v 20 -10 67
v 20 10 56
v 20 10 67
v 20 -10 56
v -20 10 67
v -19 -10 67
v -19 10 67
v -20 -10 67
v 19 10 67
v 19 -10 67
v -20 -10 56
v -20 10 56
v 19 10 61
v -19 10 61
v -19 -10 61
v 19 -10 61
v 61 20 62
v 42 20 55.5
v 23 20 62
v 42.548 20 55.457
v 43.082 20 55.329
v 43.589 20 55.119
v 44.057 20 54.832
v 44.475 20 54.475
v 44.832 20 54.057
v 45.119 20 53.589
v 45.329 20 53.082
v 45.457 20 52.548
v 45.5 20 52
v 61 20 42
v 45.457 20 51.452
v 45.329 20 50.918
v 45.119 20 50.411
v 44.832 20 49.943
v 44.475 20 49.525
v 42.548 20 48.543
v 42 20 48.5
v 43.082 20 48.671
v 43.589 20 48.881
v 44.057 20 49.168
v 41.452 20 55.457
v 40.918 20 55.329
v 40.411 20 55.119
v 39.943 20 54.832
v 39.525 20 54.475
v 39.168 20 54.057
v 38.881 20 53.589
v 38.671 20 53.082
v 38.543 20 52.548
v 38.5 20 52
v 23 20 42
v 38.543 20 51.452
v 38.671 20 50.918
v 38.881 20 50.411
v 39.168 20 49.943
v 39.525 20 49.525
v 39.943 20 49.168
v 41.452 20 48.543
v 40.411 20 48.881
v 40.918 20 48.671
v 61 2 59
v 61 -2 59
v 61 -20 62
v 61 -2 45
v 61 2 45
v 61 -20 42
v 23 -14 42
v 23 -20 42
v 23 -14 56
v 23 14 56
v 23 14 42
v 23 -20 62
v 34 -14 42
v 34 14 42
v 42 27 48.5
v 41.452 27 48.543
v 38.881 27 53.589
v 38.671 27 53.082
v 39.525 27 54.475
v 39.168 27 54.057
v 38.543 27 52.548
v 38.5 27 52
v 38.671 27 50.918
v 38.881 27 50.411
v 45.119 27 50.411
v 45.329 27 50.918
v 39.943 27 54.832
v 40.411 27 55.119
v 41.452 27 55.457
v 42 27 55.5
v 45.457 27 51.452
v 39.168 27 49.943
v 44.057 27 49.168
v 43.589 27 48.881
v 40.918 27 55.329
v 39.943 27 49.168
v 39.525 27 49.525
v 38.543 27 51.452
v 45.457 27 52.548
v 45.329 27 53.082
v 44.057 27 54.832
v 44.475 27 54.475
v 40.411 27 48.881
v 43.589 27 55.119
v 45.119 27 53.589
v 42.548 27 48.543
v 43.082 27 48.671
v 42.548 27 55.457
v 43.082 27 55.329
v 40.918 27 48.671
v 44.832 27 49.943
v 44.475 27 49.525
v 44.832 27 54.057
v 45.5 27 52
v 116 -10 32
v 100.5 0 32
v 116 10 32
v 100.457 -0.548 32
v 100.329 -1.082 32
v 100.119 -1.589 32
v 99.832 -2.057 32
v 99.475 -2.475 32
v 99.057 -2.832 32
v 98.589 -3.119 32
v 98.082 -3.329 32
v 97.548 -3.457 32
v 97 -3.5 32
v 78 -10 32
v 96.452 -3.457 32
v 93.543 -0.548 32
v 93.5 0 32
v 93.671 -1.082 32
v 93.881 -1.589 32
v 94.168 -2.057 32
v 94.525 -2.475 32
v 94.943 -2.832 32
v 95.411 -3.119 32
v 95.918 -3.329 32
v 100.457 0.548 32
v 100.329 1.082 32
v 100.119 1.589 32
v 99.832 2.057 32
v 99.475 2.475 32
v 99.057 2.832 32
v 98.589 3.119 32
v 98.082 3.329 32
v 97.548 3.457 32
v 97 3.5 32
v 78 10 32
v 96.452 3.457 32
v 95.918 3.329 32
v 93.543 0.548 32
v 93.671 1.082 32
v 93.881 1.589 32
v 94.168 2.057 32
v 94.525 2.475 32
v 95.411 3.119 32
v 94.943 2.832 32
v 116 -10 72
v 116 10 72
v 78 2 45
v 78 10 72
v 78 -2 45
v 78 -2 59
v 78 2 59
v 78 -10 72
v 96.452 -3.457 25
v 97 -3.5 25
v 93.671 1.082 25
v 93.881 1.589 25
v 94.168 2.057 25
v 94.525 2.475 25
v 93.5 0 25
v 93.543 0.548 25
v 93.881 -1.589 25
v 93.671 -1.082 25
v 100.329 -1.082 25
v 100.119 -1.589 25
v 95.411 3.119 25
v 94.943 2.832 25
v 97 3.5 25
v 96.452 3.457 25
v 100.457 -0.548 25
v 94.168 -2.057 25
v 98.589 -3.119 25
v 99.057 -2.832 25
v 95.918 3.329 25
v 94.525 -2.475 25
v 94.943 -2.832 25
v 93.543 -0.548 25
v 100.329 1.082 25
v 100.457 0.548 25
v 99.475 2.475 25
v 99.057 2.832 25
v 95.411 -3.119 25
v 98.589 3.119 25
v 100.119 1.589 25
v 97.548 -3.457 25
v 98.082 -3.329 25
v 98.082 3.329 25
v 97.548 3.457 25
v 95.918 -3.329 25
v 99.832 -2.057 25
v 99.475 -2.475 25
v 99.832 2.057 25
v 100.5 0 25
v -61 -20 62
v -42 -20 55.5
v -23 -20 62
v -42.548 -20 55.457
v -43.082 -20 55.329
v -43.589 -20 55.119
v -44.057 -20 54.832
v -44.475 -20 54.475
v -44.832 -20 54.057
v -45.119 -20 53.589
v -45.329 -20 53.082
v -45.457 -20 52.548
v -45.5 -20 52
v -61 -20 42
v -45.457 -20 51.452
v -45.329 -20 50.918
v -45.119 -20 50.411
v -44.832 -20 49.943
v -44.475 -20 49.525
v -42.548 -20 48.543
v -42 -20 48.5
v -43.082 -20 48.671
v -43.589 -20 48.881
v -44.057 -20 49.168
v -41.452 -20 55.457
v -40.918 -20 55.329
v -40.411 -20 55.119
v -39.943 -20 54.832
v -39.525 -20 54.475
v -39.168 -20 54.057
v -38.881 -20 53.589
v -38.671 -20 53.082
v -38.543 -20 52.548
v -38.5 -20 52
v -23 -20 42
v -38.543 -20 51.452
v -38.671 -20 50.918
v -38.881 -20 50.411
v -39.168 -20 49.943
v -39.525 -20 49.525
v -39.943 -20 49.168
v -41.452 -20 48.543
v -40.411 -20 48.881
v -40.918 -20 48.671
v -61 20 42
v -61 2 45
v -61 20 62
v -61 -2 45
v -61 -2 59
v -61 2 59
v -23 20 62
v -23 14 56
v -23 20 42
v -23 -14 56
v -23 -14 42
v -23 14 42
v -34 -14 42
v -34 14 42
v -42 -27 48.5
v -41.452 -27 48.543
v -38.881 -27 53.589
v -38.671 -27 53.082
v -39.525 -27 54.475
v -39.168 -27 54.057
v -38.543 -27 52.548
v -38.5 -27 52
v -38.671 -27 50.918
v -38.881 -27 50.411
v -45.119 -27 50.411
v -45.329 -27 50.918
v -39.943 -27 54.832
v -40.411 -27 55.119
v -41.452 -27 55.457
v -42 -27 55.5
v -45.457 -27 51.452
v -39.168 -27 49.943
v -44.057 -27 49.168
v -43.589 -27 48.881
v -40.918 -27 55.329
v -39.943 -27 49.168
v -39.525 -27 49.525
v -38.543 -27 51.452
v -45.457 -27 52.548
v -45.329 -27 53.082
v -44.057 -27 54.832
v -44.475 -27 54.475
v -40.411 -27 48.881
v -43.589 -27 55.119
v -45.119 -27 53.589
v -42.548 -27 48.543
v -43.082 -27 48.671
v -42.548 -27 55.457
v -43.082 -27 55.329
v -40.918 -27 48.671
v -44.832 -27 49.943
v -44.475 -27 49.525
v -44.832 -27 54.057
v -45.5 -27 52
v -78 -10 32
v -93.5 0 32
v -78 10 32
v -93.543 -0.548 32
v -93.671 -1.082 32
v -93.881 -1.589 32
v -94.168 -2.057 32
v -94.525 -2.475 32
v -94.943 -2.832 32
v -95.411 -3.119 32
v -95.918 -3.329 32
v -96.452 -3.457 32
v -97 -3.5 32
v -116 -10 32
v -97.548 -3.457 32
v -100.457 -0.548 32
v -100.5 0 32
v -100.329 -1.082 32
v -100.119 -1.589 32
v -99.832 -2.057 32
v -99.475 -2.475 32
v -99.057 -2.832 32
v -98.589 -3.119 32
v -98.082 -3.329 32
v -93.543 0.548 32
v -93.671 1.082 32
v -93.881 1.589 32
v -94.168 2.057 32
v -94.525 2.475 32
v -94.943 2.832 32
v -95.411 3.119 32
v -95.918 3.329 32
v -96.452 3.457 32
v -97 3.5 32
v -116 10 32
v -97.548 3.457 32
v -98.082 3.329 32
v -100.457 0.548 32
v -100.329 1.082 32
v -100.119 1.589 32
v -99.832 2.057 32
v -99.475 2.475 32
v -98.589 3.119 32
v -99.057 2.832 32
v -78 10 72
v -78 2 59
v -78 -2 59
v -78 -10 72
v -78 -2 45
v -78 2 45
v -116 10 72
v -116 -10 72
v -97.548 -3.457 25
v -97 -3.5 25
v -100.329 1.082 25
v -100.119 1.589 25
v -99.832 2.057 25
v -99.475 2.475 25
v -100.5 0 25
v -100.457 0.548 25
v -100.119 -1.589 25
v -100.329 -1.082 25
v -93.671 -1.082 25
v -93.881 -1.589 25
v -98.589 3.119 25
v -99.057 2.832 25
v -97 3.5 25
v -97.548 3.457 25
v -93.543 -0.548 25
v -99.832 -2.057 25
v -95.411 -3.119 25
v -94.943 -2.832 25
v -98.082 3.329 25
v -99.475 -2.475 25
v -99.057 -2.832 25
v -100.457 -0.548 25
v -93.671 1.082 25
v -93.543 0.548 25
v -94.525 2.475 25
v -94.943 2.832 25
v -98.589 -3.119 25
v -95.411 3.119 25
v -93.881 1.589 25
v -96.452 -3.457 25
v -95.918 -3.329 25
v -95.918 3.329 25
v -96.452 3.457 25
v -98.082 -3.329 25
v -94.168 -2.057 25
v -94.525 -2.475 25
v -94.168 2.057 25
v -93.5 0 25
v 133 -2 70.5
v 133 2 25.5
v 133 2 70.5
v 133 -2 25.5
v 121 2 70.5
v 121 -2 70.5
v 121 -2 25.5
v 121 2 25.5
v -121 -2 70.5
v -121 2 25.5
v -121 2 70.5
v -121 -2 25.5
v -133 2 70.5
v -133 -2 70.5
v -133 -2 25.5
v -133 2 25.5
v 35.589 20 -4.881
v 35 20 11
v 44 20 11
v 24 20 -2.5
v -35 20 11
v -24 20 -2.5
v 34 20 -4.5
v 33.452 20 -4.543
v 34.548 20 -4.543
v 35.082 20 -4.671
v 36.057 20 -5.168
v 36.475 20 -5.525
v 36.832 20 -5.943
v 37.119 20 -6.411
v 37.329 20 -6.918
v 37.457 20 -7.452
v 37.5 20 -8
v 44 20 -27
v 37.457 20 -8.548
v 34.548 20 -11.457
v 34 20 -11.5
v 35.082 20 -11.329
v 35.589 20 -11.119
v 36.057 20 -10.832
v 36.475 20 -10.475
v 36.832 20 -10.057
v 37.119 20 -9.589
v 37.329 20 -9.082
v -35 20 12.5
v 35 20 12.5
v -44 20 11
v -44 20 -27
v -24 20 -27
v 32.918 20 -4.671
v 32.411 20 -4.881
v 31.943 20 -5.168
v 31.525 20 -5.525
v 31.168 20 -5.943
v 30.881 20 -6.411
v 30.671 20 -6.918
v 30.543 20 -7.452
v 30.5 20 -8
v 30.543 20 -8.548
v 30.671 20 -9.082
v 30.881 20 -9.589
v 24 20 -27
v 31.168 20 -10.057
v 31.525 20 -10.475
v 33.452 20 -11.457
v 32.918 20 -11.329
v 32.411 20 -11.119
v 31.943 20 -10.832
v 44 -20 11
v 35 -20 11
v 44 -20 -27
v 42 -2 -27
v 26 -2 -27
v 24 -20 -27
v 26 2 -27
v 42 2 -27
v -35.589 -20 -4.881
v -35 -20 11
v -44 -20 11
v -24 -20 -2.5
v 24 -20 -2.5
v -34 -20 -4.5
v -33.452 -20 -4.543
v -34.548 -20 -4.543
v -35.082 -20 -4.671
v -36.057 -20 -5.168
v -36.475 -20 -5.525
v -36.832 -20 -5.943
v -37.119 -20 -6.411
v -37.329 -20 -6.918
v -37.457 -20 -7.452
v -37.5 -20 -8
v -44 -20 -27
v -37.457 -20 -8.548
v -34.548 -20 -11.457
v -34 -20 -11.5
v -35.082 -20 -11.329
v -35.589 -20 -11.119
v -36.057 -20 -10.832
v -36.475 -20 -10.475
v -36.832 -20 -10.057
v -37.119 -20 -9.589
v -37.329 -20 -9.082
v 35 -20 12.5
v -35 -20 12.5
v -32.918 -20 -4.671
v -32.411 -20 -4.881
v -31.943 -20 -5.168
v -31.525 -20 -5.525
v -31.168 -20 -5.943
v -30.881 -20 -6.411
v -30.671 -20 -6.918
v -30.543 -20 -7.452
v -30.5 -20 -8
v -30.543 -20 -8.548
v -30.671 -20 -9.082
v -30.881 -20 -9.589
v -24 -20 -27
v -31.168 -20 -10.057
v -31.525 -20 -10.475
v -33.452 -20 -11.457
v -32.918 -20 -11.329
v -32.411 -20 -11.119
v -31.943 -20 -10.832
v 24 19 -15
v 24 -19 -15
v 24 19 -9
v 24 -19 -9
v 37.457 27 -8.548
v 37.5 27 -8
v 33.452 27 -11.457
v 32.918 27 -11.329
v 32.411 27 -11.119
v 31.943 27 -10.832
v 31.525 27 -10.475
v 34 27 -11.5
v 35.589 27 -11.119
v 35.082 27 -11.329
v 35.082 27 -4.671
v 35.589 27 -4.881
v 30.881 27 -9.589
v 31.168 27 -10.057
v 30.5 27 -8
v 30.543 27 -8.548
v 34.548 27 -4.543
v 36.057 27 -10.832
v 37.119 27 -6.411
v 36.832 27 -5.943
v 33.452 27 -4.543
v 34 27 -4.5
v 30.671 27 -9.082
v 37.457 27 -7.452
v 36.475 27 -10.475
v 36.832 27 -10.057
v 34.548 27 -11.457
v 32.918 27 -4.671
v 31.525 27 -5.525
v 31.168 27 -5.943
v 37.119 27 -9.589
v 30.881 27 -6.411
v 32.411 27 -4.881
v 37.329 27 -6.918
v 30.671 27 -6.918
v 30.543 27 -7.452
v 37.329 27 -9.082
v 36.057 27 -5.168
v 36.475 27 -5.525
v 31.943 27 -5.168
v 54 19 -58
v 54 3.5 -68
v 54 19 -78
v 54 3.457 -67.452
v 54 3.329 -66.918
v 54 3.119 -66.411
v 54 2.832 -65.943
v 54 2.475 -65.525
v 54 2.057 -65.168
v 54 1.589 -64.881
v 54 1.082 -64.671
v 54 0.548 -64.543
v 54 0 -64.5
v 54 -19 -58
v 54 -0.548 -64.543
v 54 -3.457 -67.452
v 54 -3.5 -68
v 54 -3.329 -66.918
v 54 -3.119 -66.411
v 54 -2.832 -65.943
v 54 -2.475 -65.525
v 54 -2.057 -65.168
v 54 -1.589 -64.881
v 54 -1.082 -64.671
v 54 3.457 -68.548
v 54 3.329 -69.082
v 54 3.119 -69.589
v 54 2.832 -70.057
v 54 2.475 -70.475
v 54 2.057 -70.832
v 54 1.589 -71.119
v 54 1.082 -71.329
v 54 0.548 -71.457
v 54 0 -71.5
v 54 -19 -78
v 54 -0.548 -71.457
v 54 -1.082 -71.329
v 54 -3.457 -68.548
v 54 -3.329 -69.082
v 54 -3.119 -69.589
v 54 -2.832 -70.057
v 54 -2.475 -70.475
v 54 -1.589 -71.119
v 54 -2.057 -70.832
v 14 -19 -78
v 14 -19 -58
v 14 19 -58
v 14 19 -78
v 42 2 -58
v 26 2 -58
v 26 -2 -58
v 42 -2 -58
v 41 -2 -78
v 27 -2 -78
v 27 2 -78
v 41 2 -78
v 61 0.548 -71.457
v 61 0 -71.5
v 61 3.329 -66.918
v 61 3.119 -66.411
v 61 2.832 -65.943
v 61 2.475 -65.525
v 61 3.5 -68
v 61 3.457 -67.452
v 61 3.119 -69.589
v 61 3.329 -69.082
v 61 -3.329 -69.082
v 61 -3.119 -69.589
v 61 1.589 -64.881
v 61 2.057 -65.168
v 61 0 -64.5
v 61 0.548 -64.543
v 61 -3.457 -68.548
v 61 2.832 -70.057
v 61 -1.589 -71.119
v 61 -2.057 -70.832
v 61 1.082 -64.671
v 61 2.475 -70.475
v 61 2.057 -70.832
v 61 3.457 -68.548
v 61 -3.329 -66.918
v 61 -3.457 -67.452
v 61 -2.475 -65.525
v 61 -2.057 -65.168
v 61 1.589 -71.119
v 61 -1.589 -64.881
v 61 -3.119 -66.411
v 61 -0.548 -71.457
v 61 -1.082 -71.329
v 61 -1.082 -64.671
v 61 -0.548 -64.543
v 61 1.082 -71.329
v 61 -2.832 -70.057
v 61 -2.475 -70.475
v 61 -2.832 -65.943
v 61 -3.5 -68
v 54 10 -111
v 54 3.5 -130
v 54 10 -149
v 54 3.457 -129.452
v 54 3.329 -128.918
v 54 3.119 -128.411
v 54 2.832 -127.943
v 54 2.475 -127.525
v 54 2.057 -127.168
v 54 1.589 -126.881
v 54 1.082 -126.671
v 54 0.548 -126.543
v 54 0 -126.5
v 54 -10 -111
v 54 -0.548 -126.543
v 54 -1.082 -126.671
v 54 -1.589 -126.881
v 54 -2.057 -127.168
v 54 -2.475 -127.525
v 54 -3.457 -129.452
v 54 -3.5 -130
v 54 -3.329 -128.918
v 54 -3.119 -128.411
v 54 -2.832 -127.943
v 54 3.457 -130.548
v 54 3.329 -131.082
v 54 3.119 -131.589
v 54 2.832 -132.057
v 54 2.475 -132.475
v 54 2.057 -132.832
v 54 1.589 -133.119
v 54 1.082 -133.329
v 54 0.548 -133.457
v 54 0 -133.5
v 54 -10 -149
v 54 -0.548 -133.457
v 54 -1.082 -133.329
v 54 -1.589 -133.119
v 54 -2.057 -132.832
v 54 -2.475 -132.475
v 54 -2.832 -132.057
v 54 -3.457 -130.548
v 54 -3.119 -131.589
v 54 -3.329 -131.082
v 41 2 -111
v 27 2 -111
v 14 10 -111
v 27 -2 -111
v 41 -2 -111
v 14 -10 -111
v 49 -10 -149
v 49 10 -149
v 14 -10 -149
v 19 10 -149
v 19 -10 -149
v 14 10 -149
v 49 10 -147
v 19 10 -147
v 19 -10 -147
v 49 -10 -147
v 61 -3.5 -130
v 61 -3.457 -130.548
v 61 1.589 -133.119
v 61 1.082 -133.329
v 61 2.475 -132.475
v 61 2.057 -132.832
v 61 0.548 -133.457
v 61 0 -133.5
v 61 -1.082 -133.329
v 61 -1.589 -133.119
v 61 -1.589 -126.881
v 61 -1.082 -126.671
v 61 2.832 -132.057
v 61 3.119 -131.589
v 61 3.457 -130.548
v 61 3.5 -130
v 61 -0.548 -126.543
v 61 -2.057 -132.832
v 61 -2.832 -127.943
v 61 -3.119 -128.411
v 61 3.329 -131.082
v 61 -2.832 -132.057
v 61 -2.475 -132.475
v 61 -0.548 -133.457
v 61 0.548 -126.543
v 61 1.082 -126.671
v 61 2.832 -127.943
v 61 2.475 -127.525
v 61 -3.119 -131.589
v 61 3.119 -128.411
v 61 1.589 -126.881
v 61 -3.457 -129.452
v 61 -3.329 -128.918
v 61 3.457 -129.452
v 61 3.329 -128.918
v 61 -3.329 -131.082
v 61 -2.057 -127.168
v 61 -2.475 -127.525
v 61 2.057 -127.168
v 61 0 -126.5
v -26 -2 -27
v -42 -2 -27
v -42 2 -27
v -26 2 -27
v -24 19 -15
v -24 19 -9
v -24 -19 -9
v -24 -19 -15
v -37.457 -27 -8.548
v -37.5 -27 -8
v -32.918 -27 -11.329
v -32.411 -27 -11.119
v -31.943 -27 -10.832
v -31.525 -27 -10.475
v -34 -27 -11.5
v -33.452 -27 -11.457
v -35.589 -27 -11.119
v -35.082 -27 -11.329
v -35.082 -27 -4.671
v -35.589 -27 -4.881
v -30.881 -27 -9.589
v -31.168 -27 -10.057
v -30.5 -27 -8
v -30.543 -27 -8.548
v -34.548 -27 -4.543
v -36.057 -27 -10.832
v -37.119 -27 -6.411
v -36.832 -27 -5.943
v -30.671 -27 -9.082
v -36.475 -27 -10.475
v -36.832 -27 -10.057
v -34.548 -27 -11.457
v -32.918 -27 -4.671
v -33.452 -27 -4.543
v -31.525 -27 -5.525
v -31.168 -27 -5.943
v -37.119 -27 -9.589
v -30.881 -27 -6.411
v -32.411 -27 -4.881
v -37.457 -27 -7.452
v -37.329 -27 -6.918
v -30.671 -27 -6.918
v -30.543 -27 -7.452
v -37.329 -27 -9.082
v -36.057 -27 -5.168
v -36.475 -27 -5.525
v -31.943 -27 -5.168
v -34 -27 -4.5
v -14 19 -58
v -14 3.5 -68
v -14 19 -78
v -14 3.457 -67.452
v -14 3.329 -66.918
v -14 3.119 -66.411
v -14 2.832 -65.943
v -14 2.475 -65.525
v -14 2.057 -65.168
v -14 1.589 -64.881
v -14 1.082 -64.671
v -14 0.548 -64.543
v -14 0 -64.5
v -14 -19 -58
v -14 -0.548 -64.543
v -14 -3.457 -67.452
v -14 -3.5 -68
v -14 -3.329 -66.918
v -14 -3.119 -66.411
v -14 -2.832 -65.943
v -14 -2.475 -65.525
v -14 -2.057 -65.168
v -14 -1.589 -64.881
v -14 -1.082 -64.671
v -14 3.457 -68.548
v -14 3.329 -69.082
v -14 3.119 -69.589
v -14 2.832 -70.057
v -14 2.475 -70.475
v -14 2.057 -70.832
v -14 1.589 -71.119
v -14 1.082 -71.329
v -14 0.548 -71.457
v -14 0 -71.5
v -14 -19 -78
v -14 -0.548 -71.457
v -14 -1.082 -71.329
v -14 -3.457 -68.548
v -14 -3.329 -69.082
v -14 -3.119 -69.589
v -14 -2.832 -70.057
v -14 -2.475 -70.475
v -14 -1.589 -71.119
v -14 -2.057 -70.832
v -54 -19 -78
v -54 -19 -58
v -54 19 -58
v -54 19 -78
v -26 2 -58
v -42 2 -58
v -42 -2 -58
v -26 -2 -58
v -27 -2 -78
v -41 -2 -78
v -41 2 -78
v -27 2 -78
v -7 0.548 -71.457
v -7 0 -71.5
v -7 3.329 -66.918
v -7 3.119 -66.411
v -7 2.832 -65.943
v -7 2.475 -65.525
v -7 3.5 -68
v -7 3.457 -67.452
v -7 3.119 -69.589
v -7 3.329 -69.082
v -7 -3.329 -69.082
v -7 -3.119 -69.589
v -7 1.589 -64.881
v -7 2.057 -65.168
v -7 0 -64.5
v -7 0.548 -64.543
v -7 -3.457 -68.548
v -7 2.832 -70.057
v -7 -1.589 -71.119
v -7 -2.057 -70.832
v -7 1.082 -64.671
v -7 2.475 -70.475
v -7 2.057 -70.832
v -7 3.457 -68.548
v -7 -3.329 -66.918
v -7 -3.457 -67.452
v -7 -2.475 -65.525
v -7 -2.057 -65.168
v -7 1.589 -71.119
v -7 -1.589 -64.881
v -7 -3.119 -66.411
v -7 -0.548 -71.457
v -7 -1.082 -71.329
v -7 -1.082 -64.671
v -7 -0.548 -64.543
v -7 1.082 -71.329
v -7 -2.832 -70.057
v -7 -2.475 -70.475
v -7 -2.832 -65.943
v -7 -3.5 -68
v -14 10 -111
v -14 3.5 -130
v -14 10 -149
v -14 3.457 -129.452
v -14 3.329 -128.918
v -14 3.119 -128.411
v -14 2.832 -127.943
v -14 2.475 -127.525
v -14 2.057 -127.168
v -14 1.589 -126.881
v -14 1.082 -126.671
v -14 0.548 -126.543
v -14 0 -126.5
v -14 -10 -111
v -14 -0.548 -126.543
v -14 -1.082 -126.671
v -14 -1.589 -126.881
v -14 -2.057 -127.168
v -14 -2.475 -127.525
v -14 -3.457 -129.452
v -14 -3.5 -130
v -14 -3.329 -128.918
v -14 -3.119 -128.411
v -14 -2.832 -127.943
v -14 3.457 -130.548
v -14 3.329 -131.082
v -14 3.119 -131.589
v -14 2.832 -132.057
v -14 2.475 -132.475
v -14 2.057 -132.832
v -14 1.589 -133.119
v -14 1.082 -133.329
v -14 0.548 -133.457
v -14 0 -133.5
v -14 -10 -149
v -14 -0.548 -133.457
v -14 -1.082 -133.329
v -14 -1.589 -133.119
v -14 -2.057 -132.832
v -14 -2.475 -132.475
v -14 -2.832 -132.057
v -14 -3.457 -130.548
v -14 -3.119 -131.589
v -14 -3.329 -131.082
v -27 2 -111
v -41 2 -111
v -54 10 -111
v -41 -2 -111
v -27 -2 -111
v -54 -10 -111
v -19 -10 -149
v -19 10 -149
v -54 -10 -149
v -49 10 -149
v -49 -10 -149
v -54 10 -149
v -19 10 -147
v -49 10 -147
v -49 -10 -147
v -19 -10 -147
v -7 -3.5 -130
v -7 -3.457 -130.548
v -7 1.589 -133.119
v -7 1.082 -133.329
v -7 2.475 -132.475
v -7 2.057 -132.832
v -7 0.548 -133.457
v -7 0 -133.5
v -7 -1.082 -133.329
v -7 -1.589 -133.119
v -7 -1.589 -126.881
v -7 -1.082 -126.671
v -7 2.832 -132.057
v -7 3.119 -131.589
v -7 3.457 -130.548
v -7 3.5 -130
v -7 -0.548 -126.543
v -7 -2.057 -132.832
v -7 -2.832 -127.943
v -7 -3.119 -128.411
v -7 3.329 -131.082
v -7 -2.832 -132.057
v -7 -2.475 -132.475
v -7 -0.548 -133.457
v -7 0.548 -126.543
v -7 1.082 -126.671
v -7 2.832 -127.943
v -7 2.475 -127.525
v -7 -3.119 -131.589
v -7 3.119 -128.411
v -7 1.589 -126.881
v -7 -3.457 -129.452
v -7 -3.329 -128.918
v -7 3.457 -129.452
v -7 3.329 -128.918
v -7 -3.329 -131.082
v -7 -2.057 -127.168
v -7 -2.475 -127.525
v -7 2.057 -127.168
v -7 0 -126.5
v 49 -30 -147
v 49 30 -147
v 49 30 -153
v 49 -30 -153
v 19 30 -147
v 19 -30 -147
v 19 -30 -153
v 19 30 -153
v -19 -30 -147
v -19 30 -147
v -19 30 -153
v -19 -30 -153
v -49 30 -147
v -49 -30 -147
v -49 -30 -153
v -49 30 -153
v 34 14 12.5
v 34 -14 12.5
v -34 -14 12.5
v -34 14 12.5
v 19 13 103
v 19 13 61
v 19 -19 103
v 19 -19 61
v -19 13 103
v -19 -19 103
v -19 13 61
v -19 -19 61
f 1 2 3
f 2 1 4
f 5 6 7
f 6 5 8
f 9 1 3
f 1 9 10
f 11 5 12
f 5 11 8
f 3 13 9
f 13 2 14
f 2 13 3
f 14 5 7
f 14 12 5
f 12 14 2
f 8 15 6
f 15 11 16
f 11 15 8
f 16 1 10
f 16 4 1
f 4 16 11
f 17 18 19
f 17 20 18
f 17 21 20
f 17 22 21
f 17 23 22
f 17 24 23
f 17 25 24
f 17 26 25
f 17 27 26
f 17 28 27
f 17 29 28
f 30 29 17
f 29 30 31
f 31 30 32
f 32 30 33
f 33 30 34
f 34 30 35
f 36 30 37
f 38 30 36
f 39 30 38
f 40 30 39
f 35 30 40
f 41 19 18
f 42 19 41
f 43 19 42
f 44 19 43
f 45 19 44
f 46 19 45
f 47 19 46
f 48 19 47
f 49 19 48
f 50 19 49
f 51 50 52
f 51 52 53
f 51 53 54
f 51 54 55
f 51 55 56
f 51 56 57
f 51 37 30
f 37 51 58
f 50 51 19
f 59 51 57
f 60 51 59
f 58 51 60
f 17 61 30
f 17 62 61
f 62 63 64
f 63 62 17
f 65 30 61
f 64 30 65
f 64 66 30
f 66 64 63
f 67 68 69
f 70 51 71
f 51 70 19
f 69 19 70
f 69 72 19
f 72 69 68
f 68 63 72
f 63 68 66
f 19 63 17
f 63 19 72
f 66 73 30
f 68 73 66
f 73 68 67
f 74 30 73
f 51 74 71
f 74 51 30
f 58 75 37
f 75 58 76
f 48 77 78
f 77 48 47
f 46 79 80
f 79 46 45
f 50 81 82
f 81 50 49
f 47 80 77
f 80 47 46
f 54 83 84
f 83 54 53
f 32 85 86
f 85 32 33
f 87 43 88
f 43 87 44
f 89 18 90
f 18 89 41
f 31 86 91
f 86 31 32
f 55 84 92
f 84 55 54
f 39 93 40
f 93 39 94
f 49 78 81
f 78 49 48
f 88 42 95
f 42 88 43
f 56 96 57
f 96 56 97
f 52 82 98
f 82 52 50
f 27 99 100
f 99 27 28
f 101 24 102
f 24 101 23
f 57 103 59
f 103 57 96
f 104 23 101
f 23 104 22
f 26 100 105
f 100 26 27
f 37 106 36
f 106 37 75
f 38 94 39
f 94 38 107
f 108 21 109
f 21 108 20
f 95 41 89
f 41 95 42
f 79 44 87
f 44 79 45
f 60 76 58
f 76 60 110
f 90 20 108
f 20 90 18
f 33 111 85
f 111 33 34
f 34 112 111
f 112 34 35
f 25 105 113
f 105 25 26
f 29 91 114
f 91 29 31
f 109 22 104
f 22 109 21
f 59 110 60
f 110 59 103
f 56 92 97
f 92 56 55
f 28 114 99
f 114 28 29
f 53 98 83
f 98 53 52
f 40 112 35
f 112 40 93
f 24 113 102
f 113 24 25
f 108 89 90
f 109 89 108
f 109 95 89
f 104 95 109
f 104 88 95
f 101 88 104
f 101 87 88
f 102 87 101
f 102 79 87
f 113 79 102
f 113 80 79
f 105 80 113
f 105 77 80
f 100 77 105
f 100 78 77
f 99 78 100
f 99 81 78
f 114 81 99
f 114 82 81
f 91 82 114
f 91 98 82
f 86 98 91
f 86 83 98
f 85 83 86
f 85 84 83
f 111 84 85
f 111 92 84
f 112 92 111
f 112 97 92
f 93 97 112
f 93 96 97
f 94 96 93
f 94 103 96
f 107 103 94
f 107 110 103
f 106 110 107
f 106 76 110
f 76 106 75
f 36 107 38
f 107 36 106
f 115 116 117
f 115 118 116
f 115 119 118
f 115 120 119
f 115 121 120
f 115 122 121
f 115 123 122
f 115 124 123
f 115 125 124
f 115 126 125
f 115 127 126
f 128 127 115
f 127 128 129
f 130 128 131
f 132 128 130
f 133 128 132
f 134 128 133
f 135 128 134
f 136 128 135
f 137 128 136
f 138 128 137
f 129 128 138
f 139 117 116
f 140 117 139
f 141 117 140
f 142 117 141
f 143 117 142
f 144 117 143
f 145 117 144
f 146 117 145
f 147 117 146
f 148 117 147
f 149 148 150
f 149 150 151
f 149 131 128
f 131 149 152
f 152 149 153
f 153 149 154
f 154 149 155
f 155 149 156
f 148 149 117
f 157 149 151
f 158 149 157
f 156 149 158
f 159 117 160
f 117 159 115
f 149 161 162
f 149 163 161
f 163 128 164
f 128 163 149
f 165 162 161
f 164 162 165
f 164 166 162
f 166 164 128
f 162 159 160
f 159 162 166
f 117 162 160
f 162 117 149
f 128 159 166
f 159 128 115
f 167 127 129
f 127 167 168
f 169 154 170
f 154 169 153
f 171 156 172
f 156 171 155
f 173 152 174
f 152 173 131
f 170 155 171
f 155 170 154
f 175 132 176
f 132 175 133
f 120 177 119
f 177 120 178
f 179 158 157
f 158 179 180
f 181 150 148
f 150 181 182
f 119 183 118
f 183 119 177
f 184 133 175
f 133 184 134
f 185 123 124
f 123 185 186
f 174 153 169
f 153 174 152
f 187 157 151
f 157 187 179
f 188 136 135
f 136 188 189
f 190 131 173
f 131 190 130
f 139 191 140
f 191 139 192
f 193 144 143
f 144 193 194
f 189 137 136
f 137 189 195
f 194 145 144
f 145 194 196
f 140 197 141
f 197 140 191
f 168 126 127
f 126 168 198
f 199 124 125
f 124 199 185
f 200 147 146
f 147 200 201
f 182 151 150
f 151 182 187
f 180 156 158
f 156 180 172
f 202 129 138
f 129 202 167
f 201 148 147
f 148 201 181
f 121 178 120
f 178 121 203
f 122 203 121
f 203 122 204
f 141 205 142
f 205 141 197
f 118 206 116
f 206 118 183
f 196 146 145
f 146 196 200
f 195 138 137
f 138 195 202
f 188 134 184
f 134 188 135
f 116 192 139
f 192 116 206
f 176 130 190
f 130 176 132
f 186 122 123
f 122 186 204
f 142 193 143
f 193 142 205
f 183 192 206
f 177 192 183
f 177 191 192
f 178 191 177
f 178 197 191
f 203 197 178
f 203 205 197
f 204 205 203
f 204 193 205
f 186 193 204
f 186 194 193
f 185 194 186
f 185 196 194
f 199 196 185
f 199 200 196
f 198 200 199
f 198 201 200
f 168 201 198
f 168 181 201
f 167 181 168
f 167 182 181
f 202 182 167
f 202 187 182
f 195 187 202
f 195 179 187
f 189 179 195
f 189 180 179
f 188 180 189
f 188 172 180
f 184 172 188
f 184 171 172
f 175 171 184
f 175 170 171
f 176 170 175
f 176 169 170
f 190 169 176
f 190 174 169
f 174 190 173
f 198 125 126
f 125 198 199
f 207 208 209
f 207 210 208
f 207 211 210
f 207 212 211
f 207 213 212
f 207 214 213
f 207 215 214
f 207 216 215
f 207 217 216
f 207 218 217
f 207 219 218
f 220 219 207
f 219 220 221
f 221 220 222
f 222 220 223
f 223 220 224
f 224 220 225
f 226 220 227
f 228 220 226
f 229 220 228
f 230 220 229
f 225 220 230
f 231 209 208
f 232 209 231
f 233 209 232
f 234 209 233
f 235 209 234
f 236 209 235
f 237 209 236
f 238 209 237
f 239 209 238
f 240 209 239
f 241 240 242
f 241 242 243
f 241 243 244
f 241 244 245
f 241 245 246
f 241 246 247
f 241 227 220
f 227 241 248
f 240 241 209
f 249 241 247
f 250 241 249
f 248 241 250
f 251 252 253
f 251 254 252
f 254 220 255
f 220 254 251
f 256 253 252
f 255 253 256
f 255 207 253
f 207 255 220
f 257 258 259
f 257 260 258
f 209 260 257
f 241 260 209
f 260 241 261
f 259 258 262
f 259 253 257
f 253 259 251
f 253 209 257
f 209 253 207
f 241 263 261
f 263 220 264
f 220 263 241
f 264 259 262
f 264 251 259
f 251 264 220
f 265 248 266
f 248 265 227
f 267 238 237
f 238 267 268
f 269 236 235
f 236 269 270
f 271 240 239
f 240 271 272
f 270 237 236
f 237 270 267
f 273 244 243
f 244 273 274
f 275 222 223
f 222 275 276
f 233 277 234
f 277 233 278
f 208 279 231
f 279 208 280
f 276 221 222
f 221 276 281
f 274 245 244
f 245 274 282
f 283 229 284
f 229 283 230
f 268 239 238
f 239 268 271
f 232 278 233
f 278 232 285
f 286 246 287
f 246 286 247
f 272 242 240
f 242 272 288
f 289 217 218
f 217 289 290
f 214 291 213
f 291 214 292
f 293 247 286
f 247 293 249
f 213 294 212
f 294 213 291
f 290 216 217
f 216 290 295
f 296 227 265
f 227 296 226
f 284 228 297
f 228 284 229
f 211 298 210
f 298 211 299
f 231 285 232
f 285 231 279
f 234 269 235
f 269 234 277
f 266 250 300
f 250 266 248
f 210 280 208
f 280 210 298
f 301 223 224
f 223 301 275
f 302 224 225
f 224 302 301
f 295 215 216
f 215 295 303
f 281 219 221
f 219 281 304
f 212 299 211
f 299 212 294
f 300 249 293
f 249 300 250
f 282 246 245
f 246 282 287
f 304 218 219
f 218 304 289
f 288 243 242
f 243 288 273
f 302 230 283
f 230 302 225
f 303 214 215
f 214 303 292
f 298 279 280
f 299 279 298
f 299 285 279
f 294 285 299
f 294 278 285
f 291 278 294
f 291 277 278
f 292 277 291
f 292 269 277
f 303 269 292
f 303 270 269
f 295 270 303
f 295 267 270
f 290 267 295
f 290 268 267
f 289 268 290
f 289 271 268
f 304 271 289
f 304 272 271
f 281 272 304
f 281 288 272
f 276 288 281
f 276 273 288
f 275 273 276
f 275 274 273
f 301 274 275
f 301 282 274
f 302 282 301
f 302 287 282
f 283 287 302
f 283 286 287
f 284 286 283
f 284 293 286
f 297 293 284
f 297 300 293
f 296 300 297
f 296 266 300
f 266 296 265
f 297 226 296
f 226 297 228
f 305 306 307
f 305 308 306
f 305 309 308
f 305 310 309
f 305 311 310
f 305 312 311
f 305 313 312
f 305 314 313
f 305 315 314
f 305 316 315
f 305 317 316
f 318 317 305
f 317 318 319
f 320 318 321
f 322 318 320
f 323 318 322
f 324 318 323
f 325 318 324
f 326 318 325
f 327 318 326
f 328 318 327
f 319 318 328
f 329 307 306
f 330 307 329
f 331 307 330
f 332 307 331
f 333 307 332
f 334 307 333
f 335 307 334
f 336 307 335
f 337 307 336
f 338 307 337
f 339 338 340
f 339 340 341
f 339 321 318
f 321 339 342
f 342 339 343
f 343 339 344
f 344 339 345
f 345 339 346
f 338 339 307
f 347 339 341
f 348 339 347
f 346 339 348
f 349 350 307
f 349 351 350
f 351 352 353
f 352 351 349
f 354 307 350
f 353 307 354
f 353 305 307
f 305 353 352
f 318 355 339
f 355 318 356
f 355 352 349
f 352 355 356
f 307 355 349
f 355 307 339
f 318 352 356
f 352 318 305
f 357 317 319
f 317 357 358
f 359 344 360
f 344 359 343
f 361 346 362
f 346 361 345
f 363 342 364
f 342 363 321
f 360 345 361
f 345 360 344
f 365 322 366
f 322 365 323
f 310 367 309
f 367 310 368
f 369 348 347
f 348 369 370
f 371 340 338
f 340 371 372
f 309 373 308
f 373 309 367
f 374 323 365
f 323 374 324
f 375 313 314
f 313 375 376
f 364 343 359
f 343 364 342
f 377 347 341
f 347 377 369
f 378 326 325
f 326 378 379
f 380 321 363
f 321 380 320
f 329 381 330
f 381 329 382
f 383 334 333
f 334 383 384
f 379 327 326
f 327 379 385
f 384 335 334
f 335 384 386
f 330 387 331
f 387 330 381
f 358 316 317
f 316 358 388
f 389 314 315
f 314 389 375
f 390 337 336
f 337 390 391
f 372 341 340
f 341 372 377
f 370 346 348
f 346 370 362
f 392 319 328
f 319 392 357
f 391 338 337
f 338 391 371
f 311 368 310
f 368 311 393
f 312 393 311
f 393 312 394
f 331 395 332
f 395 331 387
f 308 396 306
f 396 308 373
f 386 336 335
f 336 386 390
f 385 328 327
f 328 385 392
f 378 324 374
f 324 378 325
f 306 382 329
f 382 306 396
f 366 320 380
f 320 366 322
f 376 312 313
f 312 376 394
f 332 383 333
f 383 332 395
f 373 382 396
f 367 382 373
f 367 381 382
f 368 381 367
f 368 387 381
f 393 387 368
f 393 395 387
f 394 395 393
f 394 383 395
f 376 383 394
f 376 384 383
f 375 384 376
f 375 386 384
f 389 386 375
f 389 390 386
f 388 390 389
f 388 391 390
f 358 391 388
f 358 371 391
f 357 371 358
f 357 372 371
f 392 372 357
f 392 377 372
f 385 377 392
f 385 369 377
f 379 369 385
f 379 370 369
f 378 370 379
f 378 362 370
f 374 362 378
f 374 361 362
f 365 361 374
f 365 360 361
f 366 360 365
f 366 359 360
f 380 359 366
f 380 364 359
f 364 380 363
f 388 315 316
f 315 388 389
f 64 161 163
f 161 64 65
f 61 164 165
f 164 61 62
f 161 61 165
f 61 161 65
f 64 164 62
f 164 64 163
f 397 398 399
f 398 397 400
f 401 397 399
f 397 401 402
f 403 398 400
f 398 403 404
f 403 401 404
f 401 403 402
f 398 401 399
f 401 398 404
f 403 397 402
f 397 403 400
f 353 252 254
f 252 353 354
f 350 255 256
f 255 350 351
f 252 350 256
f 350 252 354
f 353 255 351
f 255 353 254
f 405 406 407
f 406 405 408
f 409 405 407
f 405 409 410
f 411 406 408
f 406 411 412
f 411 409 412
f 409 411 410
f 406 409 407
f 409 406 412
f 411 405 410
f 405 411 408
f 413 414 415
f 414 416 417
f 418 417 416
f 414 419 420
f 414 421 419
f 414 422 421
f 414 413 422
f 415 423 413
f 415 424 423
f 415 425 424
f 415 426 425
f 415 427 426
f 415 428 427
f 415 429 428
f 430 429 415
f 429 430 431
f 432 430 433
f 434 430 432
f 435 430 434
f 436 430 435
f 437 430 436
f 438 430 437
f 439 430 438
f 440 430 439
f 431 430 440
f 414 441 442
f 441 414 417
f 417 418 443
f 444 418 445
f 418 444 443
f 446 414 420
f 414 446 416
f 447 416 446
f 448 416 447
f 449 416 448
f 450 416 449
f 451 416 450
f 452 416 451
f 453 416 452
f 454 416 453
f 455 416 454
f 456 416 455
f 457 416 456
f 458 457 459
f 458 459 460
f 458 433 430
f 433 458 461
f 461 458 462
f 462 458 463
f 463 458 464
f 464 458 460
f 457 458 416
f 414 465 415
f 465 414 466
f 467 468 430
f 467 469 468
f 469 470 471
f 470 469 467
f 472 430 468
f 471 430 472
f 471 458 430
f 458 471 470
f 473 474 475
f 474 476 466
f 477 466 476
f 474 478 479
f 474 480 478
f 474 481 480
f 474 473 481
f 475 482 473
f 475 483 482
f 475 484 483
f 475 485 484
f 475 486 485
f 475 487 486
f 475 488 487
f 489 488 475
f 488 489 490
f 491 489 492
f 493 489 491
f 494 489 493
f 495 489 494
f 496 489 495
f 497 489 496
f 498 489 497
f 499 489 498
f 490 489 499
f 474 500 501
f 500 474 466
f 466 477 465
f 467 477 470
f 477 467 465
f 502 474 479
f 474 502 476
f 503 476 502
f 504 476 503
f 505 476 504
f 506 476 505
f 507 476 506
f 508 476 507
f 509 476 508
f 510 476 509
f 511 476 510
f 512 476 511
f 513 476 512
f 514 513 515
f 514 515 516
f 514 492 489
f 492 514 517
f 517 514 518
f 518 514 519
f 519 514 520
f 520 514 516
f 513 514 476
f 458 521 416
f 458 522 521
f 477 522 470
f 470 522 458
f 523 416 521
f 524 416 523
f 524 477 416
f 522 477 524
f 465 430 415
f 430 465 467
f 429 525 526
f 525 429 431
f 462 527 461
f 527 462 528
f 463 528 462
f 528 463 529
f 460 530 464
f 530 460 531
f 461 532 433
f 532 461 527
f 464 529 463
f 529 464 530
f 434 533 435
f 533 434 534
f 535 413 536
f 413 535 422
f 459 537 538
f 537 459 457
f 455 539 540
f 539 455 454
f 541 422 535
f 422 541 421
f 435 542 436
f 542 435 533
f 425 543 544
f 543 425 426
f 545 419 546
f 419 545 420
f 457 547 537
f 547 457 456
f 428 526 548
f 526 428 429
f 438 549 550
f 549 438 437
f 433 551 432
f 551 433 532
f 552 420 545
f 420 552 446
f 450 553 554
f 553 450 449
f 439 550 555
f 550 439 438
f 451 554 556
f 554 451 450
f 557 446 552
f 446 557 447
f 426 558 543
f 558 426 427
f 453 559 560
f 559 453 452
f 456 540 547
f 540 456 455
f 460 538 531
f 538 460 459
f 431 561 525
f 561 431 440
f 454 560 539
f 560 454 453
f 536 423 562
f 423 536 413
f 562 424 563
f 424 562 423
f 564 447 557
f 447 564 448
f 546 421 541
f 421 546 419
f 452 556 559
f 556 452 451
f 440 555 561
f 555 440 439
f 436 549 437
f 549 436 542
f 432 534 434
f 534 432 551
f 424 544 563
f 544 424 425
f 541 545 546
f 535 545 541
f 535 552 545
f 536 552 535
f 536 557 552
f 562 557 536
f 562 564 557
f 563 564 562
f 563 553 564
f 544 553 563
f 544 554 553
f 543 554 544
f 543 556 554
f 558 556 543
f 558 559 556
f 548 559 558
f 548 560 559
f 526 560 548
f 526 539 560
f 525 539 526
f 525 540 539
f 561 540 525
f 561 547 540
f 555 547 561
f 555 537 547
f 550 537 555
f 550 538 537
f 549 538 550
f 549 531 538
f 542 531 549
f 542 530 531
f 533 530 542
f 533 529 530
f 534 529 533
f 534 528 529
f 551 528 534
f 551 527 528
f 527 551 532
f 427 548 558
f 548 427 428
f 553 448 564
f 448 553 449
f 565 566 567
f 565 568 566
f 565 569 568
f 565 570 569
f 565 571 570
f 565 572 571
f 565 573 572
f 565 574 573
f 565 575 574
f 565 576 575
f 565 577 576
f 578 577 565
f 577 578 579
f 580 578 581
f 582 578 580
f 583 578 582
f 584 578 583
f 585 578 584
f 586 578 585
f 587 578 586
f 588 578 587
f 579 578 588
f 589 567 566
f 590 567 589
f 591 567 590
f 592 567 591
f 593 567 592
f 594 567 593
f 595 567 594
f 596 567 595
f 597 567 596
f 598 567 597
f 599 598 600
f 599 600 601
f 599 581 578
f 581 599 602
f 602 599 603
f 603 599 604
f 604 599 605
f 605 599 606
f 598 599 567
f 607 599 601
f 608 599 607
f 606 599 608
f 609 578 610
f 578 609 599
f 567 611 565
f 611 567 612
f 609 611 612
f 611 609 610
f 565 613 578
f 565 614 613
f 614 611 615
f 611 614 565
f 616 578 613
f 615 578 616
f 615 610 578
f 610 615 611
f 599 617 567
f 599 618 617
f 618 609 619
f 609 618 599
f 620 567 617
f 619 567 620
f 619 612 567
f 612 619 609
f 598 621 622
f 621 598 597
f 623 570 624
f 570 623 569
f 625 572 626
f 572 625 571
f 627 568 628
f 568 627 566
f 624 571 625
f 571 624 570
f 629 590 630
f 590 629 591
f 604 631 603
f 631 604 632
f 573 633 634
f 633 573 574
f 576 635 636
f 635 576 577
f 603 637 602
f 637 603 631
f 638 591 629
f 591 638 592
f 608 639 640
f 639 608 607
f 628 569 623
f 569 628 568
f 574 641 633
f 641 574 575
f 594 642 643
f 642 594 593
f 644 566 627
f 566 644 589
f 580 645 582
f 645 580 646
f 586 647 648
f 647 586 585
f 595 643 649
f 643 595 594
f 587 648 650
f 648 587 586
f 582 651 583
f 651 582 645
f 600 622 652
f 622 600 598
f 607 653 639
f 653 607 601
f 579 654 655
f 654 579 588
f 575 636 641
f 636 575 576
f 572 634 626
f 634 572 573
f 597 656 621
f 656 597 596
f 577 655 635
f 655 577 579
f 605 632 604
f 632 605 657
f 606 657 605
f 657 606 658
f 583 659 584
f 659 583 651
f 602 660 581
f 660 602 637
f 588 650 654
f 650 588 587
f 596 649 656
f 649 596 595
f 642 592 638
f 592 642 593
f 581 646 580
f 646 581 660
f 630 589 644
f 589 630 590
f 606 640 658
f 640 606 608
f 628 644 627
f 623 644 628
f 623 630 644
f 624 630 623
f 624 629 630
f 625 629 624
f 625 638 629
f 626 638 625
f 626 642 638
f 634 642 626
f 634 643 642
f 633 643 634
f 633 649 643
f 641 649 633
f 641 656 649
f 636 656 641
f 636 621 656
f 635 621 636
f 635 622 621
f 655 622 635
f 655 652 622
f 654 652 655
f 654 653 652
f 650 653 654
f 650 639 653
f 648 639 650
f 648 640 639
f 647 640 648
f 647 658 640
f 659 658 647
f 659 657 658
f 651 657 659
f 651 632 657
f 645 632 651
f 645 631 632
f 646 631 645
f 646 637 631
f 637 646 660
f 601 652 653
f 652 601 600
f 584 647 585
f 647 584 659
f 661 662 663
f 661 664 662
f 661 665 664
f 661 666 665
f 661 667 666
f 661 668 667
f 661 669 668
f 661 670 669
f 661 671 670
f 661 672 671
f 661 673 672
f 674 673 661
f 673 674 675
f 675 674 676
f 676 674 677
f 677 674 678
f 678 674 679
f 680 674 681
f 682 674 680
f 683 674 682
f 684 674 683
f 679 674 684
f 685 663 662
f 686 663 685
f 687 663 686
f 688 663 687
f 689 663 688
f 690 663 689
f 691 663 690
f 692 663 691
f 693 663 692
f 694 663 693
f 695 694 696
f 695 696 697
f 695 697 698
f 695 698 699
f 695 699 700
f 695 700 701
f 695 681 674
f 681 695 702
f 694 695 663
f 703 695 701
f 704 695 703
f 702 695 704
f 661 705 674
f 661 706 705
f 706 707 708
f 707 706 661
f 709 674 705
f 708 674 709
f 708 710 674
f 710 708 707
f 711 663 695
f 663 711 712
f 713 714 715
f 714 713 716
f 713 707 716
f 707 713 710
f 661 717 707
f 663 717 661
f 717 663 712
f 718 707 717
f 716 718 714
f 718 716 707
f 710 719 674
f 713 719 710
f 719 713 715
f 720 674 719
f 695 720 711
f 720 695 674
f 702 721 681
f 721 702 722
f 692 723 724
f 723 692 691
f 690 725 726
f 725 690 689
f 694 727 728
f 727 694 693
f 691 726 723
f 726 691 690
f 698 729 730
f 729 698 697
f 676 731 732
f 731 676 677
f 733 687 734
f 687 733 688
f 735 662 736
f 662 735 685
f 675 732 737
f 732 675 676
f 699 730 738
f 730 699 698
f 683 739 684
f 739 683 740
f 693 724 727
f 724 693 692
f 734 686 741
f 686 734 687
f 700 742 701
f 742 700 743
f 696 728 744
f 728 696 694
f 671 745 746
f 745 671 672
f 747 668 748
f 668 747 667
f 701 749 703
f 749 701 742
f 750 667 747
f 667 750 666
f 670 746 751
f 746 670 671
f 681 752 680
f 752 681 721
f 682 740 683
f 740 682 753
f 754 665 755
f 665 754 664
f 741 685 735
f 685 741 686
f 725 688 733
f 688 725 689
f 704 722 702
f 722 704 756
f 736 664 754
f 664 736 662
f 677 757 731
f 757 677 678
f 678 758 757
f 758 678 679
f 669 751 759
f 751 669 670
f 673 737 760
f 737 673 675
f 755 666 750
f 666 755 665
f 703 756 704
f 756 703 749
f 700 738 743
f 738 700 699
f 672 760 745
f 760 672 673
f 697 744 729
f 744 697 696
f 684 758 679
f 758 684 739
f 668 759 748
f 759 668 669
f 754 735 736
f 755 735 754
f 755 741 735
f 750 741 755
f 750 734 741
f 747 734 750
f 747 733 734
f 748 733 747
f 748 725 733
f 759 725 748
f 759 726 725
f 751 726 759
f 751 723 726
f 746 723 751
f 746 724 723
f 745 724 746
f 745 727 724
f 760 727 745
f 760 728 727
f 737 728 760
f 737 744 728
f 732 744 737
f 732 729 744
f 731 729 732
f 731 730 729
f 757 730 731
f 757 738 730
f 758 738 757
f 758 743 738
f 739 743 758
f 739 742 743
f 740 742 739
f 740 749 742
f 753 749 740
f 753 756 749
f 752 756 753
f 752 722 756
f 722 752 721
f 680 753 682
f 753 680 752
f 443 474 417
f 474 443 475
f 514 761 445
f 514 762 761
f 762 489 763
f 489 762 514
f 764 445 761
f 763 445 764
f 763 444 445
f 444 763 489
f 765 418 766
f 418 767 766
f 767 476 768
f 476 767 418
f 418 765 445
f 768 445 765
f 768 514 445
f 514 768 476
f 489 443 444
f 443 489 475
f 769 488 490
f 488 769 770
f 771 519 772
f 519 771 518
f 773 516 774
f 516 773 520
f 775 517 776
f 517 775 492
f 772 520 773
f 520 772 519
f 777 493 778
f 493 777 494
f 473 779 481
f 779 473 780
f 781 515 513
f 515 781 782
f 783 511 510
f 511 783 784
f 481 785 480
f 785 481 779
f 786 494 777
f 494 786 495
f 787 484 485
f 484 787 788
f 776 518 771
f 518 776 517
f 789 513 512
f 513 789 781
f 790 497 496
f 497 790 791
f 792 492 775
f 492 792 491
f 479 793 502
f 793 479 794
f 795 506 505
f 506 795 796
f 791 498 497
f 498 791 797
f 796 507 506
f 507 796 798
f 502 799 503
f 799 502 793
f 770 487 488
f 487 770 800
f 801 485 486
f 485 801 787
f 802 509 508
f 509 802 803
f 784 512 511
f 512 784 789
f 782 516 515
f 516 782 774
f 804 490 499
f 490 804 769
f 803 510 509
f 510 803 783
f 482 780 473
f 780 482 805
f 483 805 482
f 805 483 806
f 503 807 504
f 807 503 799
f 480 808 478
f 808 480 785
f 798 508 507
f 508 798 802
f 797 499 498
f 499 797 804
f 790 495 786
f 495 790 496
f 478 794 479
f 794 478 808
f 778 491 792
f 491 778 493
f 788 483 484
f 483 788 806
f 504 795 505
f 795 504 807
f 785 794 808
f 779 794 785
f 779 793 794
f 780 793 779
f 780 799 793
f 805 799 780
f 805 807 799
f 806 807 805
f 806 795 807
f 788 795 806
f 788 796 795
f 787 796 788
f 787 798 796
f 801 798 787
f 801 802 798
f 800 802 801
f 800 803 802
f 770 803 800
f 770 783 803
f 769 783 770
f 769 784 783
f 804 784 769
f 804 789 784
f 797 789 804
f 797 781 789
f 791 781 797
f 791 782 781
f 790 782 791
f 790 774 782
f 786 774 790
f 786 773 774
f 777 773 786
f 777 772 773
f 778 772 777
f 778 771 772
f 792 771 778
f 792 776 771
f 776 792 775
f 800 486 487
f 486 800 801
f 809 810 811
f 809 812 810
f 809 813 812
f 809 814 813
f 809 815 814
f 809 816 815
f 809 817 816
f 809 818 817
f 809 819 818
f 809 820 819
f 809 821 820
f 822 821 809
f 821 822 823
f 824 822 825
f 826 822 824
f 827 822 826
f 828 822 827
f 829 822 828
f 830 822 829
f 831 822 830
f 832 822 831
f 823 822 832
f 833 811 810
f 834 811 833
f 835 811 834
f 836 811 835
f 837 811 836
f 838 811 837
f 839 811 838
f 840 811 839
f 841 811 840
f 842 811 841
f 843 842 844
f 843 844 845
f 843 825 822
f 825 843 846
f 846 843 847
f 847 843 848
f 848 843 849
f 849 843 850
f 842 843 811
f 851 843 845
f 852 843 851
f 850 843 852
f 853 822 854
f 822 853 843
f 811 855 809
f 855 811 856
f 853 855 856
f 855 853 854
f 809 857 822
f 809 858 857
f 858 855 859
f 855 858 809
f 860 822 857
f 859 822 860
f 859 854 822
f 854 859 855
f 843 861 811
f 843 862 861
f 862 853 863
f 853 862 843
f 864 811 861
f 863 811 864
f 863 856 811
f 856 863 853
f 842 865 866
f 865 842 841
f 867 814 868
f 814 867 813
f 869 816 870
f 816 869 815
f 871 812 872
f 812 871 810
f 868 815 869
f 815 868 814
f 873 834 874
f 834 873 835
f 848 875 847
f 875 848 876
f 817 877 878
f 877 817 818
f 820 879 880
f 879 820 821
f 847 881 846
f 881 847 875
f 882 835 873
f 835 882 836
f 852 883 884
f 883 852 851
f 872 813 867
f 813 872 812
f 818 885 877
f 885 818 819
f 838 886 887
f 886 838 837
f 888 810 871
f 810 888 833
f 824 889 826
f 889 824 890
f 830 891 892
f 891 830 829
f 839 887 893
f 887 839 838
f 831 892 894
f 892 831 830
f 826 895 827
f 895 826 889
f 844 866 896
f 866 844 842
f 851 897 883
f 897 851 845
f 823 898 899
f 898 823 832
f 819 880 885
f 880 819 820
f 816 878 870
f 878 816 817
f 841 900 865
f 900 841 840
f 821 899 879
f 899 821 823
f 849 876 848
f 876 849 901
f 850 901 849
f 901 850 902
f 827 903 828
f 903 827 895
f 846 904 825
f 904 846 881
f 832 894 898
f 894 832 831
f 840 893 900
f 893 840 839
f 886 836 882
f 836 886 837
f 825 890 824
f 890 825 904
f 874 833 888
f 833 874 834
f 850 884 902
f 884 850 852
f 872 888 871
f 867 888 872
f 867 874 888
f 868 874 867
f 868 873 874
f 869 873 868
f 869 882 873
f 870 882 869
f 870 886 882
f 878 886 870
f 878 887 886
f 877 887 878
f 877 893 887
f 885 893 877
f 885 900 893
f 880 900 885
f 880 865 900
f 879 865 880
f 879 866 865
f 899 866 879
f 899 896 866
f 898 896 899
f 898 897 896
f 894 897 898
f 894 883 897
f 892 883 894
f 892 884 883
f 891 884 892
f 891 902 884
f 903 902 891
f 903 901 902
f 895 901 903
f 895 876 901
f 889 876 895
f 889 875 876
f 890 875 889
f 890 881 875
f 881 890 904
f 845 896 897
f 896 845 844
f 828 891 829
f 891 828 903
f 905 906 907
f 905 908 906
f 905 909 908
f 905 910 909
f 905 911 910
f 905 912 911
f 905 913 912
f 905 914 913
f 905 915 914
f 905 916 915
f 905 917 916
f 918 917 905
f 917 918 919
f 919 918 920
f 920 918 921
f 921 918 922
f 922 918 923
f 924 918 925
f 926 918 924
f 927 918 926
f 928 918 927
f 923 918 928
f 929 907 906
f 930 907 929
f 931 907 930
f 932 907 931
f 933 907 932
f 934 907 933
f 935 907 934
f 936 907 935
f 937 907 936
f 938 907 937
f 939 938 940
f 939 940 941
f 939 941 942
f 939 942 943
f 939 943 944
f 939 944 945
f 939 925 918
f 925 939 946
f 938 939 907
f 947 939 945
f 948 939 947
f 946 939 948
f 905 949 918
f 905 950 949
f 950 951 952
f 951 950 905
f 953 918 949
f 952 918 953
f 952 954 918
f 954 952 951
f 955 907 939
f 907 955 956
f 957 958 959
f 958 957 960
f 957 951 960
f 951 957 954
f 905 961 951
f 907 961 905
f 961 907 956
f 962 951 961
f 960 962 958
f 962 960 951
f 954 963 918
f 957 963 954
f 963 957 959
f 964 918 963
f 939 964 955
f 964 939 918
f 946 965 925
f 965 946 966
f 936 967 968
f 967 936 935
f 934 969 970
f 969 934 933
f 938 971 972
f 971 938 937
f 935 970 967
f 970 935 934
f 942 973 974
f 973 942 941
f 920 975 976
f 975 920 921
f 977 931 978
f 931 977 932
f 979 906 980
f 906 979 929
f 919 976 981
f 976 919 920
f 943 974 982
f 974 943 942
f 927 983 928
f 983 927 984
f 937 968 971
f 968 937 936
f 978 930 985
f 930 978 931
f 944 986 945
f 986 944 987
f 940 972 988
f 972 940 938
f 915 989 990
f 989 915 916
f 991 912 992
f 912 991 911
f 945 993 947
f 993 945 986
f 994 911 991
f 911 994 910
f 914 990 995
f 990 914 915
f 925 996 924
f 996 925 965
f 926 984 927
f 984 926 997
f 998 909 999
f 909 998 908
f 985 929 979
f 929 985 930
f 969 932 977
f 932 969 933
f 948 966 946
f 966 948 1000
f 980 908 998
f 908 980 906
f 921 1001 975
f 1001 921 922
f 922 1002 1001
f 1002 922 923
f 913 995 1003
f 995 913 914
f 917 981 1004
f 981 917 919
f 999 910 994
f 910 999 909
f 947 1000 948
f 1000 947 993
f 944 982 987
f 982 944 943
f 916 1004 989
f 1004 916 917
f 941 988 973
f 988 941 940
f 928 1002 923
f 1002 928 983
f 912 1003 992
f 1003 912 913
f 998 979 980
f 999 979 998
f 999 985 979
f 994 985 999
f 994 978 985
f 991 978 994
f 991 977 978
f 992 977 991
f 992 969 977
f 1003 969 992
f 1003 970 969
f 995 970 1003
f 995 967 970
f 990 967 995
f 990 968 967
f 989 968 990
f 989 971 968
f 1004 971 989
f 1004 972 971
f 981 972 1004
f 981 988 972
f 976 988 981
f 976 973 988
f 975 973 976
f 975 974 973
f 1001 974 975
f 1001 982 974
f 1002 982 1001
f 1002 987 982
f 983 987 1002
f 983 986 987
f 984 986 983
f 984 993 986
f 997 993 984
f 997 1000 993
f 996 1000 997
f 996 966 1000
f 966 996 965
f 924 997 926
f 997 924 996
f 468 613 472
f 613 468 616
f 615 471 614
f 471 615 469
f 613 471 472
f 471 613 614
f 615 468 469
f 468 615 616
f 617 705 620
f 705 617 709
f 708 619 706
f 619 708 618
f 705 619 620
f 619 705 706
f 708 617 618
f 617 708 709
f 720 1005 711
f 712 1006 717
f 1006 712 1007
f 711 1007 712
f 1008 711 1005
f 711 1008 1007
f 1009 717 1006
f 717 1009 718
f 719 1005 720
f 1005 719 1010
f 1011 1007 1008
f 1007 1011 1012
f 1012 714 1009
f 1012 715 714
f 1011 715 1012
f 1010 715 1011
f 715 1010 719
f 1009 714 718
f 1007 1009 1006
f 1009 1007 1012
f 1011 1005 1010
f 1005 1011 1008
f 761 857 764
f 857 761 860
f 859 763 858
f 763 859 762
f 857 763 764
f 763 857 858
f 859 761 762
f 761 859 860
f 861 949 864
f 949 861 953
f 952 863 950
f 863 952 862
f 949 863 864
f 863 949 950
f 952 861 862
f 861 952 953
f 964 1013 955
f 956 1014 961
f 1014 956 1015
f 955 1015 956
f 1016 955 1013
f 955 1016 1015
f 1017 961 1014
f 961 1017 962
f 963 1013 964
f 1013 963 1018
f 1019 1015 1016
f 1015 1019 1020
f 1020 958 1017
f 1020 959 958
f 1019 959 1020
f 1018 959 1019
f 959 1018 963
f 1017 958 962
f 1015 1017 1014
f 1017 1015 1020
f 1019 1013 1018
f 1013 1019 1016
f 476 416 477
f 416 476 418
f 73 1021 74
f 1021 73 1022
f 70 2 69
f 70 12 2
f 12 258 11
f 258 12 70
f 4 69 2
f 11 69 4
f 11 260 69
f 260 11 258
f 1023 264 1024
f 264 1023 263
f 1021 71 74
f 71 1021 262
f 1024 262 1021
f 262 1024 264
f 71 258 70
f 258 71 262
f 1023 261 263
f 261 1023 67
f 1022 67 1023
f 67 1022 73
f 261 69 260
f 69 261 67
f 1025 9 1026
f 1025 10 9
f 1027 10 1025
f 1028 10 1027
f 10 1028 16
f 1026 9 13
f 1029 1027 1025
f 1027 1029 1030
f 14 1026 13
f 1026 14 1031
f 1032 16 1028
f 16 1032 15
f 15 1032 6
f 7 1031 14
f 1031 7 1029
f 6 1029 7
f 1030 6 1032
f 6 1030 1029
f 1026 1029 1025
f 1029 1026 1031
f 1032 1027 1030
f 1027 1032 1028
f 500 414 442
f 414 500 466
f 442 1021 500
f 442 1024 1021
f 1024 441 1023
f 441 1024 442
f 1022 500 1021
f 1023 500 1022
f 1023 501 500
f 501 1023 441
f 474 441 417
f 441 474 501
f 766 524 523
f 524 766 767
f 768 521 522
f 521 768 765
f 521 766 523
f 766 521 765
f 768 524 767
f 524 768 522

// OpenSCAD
// ============================================================================
// PROJECT AEVUM - SIMPLE INTERCONNECTED BASE MODEL
// Fake servo blocks + strong structural connections
// ============================================================================

$fn = 40;

servo_size = [40, 20, 38];     // Fake servo dimensions (L,W,H)
bone_thick = 4;

// Colors
color_frame   = [0.18, 0.18, 0.22];
color_bone    = [0.0, 0.65, 0.9, 0.7];
color_servo   = [0.1, 0.1, 0.12];
color_armor   = [0.05, 0.4, 0.4];

// Fake Servo Module
module fake_servo(pos=[0,0,0], rot=[0,0,0]) {
    translate(pos) rotate(rot) {
        color(color_servo) cube(servo_size, center=true);
        // Simple shaft
        color([0.7,0.7,0.7]) translate([22,0,0]) rotate([0,90,0]) cylinder(d=7, h=10, center=true);
    }
}

// Bone / Link
module bone(length=50, width=14, height=bone_thick, pos=[0,0,0], rot=[0,0,0]) {
    translate(pos) rotate(rot)
        color(color_bone) cube([width, height, length], center=true);
}

// Main Interconnected Chassis
module aevum_base() {
    
    // === CENTRAL BASE / PELVIS ===
    color(color_frame) translate([0,0,5]) cube([70, 40, 15], center=true);
    
    // === UPPER BODY (Neck + Arms) ===
    fake_servo([0, 0, 48]);                    // Neck
    
    for (side = [1, -1]) {
        // Shoulder
        fake_servo([42*side, 0, 52], [90, 0, 90*side]);
        
        // Upper arm bone
        bone(45, 14, bone_thick, [42*side + 25*side, 0, 52], [0,90,0]);
        
        // Elbow
        fake_servo([42*side + 55*side, 0, 52], [0, 90, 0]);
        
        // Forearm bone
        bone(45, 12, bone_thick, [42*side + 85*side, 0, 48]);
    }
    
    // === LOWER BODY (Legs - 6 Servos) ===
    for (side = [1, -1]) {
        // Hip
        fake_servo([34*side, 0, -8], [0,0,90*side]);
        bone(55, 16, bone_thick, [34*side, 0, -38]);
        
        // Knee
        fake_servo([34*side, 0, -68], [90,0,0]);
        bone(52, 14, bone_thick, [34*side, 0, -98]);
        
        // Ankle
        fake_servo([34*side, 0, -130]);
        
        // Foot base
        color(color_frame) translate([34*side, 0, -150]) cube([30, 60, 6], center=true);
    }
    
    // === INTERCONNECTING STRUCTURE ===
    // Spine / Torso column
    color(color_frame) {
        translate([8,0,25]) cube([6, 12, 55], center=true);
        translate([-8,0,25]) cube([6, 12, 55], center=true);
    }
    
    // Shoulder cross beam
    color(color_frame) translate([0,0,52]) cube([90, 22, 8], center=true);
    
    // Hip reinforcement plate
    color(color_frame) translate([0,0,-12]) cube([80, 38, 6], center=true);
    
    // Outer Armor Shell (simplified)
    color(color_armor, 0.6) {
        // Torso
        translate([0,0,32]) cube([68, 28, 48], center=true);
        // Head
        translate([0,-3,82]) cube([38, 32, 42], center=true);
    }
}

aevum_base();

echo("=== Simple Interconnected Base Model Ready ===");
echo("All fake servos are linked via bones and structural plates.");
